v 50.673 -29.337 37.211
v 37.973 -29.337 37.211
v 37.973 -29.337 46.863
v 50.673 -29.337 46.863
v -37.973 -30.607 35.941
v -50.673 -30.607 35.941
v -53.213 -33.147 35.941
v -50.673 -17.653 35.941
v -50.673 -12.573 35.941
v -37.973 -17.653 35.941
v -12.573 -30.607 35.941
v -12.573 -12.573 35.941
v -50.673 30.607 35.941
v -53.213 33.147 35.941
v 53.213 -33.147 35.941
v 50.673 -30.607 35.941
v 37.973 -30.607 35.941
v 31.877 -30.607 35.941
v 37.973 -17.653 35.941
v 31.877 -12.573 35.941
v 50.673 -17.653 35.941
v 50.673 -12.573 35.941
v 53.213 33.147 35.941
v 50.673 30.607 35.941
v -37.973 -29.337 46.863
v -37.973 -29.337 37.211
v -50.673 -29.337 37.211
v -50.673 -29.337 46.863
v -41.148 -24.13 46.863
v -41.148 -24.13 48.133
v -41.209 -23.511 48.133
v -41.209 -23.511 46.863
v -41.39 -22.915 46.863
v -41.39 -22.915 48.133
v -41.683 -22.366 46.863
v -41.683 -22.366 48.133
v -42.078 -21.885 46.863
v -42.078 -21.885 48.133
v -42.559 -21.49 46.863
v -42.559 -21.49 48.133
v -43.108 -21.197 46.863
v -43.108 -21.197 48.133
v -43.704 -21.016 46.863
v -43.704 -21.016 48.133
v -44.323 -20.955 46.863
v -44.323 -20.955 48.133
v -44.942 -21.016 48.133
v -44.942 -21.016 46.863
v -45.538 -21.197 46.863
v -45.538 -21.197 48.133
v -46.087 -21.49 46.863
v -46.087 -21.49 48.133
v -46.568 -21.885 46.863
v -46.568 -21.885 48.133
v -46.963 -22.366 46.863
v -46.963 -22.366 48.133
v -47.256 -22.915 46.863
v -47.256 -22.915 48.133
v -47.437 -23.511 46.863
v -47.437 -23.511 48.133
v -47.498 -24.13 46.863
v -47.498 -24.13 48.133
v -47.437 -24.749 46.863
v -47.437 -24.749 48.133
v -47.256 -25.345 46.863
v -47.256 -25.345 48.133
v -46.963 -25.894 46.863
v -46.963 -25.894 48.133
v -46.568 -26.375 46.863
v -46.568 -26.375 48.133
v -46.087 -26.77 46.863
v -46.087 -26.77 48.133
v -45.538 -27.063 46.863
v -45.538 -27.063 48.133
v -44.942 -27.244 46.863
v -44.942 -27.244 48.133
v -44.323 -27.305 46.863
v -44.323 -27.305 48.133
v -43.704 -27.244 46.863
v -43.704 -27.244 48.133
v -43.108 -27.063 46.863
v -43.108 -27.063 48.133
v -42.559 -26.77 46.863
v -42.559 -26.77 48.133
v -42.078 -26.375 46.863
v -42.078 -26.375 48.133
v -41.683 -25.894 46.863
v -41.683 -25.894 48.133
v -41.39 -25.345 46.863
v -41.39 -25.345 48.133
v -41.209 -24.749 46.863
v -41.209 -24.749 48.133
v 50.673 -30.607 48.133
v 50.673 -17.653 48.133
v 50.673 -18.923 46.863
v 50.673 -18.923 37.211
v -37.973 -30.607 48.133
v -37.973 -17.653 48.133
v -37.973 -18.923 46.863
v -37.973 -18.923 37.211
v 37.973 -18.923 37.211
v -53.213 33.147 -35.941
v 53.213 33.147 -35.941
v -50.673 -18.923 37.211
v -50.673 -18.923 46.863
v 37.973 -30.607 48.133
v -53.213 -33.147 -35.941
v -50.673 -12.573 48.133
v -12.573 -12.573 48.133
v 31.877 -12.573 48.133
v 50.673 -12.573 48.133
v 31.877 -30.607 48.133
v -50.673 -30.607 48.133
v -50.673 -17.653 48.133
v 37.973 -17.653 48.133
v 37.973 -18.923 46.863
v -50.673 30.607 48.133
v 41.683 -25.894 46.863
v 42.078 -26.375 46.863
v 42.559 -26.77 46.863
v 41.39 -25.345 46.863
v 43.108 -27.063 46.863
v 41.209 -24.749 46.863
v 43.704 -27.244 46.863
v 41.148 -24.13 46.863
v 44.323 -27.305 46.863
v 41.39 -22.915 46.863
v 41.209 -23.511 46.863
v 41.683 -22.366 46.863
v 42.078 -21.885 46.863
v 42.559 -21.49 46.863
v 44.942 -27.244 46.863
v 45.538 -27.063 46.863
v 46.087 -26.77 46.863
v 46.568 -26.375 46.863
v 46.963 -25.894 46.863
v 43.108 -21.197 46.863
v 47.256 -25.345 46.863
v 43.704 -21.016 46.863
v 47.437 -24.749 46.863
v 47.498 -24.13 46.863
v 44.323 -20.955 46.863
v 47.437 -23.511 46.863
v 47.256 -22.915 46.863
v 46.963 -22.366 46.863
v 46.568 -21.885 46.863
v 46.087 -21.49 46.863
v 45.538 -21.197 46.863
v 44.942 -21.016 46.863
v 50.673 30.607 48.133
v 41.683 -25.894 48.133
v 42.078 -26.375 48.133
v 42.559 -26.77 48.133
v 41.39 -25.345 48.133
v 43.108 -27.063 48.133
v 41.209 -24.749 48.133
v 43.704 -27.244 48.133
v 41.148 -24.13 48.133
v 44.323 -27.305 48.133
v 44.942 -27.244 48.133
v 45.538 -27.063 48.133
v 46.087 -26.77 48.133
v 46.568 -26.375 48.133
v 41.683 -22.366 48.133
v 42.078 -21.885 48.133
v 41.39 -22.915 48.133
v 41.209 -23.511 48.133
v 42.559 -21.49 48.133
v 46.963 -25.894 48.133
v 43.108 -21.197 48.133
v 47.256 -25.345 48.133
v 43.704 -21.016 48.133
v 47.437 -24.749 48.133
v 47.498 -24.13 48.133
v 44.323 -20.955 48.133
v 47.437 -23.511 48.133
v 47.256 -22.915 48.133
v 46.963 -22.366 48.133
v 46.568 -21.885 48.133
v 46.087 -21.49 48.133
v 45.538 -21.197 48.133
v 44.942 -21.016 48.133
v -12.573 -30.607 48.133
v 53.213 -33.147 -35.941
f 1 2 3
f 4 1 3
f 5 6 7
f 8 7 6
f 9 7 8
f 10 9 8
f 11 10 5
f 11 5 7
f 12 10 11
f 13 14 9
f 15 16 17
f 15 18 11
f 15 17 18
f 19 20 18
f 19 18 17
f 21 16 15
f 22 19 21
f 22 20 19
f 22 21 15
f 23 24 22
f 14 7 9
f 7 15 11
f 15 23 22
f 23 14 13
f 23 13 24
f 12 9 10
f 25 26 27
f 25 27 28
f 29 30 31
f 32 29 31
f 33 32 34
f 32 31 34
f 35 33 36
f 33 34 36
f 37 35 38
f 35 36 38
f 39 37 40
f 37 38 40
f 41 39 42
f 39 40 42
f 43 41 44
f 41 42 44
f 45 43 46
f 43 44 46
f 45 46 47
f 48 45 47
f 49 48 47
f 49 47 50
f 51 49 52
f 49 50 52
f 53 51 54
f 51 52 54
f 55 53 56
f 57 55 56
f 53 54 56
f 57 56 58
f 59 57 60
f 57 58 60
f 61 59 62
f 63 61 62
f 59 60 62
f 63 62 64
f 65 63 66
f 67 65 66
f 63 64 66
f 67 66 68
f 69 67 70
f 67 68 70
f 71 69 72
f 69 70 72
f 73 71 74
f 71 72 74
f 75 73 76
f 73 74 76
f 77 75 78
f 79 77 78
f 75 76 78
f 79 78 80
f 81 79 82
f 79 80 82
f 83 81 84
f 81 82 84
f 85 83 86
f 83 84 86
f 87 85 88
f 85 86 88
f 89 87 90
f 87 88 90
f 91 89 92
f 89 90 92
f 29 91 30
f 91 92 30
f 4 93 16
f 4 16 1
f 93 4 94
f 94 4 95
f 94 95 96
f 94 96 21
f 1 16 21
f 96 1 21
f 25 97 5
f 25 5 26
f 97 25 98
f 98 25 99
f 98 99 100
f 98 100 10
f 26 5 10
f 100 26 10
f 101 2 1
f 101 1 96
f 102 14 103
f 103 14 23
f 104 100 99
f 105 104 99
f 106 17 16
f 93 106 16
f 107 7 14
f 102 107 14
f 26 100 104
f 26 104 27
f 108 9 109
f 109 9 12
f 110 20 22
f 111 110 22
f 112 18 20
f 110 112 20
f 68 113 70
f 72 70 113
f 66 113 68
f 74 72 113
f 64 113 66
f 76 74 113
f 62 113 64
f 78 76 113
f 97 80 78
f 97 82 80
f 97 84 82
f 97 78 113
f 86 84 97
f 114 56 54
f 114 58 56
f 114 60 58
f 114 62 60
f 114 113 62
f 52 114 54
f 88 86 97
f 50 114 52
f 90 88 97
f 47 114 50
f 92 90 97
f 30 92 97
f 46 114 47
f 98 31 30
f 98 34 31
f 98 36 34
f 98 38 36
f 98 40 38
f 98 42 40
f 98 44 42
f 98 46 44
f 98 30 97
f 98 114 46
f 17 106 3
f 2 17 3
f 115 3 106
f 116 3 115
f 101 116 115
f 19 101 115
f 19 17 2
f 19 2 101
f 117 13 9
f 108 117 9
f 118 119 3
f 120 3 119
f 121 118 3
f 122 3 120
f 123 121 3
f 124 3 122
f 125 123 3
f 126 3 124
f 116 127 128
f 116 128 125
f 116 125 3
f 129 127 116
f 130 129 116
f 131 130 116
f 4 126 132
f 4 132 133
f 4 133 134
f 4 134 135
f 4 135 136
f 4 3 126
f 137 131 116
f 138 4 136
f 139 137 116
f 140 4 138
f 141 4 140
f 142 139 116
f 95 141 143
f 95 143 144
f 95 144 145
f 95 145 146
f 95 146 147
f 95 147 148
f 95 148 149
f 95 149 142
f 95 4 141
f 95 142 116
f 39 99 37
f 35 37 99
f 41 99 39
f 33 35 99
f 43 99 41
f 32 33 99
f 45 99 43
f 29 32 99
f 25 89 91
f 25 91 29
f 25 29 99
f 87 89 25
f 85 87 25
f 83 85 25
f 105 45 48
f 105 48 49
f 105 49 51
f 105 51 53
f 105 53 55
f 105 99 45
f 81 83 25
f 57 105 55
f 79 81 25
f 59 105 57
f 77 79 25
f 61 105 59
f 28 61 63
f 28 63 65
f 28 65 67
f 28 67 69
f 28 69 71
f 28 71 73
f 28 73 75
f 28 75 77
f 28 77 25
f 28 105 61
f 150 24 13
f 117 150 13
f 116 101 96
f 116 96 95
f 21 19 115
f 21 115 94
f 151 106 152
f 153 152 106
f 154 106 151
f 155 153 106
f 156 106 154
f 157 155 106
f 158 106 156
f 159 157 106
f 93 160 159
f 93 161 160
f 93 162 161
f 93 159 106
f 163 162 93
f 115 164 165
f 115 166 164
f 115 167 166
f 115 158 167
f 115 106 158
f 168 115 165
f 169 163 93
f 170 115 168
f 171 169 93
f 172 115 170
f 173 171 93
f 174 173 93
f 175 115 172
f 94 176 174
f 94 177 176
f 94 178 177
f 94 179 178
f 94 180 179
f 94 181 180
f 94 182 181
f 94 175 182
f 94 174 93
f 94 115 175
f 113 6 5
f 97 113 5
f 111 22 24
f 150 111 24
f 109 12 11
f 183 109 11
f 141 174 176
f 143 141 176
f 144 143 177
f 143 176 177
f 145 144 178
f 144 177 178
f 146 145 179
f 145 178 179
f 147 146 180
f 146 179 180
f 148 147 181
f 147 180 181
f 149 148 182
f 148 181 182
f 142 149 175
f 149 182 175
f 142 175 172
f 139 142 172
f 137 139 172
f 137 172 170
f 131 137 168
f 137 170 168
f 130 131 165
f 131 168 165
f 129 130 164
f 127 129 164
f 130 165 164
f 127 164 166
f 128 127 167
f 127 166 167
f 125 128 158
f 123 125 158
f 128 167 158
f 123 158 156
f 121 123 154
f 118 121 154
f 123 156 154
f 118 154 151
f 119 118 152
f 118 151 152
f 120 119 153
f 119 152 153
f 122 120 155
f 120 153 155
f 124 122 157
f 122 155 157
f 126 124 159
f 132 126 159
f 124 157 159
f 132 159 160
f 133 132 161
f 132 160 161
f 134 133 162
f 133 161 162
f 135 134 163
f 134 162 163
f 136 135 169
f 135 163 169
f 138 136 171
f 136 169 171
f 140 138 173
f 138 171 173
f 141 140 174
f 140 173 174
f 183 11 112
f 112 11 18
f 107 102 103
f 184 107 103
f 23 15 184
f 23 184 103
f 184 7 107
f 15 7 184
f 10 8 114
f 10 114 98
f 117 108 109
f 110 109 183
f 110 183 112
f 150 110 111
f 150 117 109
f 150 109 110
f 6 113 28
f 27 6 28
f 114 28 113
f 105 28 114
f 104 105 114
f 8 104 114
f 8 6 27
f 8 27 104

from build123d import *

# Parameters (mm, degrees)
F0_W      = 106.426
F0_H      = 66.294
F1_DEPTH  = 35.941
F2_W      = 12.7
F2_H      = 12.954
F3_DEPTH  = 12.192
F4_W      = 10.414
F4_H      = 9.652
F5_DEPTH  = 12.7
F6_W      = 10.414
F6_H      = 9.652
F7_DEPTH  = 12.7
F8_R      = 3.175
F9_DEPTH  = 1.27
F10_R     = 3.175
F11_DEPTH = 1.27


with BuildPart() as f1:
    # F0 (on Top) → F1 (new body, symmetric)
    with BuildSketch(Plane.XY):
        Rectangle(F0_W, F0_H)
    extrude(amount=F1_DEPTH, both=True)

    # F2 (on face) → F3 (join)
    with BuildSketch(Plane.XY.offset(35.941)):
        Polygon((50.673, 30.607), (-50.673, 30.607), (-50.673, -12.573), (-12.573, -12.573), (-12.573, -30.607), (31.877, -30.607), (31.877, -12.573), (50.673, -12.573), align=None)
        with Locations((-44.323, -24.13)):
            Rectangle(F2_W, F2_H)
        with Locations((44.323, -24.13)):
            Rectangle(F2_W, F2_H)
    extrude(amount=F3_DEPTH)

    # F4 (on face) → F5 (cut)
    with BuildSketch(Plane(origin=(-50.673, 0, 0), x_dir=(0, -1, 0), z_dir=(-1, 0, 0))):
        with Locations((24.13, 42.037)):
            Rectangle(F4_W, F4_H)
    extrude(amount=-F5_DEPTH, mode=Mode.SUBTRACT)

    # F6 (on face) → F7 (cut)
    with BuildSketch(Plane.YZ.offset(50.673)):
        with Locations((-24.13, 42.037)):
            Rectangle(F6_W, F6_H)
    extrude(amount=-F7_DEPTH, mode=Mode.SUBTRACT)

    # F8 (on face) → F9 (cut)
    with BuildSketch(Plane.XY.offset(48.133)):
        with Locations((-44.323, -24.13)):
            Circle(F8_R)
    extrude(amount=-F9_DEPTH, mode=Mode.SUBTRACT)

    # F10 (on face) → F11 (cut)
    with BuildSketch(Plane.XY.offset(48.133)):
        with Locations((44.323, -24.13)):
            Circle(F10_R)
    extrude(amount=-F11_DEPTH, mode=Mode.SUBTRACT)


solid = f1.part
